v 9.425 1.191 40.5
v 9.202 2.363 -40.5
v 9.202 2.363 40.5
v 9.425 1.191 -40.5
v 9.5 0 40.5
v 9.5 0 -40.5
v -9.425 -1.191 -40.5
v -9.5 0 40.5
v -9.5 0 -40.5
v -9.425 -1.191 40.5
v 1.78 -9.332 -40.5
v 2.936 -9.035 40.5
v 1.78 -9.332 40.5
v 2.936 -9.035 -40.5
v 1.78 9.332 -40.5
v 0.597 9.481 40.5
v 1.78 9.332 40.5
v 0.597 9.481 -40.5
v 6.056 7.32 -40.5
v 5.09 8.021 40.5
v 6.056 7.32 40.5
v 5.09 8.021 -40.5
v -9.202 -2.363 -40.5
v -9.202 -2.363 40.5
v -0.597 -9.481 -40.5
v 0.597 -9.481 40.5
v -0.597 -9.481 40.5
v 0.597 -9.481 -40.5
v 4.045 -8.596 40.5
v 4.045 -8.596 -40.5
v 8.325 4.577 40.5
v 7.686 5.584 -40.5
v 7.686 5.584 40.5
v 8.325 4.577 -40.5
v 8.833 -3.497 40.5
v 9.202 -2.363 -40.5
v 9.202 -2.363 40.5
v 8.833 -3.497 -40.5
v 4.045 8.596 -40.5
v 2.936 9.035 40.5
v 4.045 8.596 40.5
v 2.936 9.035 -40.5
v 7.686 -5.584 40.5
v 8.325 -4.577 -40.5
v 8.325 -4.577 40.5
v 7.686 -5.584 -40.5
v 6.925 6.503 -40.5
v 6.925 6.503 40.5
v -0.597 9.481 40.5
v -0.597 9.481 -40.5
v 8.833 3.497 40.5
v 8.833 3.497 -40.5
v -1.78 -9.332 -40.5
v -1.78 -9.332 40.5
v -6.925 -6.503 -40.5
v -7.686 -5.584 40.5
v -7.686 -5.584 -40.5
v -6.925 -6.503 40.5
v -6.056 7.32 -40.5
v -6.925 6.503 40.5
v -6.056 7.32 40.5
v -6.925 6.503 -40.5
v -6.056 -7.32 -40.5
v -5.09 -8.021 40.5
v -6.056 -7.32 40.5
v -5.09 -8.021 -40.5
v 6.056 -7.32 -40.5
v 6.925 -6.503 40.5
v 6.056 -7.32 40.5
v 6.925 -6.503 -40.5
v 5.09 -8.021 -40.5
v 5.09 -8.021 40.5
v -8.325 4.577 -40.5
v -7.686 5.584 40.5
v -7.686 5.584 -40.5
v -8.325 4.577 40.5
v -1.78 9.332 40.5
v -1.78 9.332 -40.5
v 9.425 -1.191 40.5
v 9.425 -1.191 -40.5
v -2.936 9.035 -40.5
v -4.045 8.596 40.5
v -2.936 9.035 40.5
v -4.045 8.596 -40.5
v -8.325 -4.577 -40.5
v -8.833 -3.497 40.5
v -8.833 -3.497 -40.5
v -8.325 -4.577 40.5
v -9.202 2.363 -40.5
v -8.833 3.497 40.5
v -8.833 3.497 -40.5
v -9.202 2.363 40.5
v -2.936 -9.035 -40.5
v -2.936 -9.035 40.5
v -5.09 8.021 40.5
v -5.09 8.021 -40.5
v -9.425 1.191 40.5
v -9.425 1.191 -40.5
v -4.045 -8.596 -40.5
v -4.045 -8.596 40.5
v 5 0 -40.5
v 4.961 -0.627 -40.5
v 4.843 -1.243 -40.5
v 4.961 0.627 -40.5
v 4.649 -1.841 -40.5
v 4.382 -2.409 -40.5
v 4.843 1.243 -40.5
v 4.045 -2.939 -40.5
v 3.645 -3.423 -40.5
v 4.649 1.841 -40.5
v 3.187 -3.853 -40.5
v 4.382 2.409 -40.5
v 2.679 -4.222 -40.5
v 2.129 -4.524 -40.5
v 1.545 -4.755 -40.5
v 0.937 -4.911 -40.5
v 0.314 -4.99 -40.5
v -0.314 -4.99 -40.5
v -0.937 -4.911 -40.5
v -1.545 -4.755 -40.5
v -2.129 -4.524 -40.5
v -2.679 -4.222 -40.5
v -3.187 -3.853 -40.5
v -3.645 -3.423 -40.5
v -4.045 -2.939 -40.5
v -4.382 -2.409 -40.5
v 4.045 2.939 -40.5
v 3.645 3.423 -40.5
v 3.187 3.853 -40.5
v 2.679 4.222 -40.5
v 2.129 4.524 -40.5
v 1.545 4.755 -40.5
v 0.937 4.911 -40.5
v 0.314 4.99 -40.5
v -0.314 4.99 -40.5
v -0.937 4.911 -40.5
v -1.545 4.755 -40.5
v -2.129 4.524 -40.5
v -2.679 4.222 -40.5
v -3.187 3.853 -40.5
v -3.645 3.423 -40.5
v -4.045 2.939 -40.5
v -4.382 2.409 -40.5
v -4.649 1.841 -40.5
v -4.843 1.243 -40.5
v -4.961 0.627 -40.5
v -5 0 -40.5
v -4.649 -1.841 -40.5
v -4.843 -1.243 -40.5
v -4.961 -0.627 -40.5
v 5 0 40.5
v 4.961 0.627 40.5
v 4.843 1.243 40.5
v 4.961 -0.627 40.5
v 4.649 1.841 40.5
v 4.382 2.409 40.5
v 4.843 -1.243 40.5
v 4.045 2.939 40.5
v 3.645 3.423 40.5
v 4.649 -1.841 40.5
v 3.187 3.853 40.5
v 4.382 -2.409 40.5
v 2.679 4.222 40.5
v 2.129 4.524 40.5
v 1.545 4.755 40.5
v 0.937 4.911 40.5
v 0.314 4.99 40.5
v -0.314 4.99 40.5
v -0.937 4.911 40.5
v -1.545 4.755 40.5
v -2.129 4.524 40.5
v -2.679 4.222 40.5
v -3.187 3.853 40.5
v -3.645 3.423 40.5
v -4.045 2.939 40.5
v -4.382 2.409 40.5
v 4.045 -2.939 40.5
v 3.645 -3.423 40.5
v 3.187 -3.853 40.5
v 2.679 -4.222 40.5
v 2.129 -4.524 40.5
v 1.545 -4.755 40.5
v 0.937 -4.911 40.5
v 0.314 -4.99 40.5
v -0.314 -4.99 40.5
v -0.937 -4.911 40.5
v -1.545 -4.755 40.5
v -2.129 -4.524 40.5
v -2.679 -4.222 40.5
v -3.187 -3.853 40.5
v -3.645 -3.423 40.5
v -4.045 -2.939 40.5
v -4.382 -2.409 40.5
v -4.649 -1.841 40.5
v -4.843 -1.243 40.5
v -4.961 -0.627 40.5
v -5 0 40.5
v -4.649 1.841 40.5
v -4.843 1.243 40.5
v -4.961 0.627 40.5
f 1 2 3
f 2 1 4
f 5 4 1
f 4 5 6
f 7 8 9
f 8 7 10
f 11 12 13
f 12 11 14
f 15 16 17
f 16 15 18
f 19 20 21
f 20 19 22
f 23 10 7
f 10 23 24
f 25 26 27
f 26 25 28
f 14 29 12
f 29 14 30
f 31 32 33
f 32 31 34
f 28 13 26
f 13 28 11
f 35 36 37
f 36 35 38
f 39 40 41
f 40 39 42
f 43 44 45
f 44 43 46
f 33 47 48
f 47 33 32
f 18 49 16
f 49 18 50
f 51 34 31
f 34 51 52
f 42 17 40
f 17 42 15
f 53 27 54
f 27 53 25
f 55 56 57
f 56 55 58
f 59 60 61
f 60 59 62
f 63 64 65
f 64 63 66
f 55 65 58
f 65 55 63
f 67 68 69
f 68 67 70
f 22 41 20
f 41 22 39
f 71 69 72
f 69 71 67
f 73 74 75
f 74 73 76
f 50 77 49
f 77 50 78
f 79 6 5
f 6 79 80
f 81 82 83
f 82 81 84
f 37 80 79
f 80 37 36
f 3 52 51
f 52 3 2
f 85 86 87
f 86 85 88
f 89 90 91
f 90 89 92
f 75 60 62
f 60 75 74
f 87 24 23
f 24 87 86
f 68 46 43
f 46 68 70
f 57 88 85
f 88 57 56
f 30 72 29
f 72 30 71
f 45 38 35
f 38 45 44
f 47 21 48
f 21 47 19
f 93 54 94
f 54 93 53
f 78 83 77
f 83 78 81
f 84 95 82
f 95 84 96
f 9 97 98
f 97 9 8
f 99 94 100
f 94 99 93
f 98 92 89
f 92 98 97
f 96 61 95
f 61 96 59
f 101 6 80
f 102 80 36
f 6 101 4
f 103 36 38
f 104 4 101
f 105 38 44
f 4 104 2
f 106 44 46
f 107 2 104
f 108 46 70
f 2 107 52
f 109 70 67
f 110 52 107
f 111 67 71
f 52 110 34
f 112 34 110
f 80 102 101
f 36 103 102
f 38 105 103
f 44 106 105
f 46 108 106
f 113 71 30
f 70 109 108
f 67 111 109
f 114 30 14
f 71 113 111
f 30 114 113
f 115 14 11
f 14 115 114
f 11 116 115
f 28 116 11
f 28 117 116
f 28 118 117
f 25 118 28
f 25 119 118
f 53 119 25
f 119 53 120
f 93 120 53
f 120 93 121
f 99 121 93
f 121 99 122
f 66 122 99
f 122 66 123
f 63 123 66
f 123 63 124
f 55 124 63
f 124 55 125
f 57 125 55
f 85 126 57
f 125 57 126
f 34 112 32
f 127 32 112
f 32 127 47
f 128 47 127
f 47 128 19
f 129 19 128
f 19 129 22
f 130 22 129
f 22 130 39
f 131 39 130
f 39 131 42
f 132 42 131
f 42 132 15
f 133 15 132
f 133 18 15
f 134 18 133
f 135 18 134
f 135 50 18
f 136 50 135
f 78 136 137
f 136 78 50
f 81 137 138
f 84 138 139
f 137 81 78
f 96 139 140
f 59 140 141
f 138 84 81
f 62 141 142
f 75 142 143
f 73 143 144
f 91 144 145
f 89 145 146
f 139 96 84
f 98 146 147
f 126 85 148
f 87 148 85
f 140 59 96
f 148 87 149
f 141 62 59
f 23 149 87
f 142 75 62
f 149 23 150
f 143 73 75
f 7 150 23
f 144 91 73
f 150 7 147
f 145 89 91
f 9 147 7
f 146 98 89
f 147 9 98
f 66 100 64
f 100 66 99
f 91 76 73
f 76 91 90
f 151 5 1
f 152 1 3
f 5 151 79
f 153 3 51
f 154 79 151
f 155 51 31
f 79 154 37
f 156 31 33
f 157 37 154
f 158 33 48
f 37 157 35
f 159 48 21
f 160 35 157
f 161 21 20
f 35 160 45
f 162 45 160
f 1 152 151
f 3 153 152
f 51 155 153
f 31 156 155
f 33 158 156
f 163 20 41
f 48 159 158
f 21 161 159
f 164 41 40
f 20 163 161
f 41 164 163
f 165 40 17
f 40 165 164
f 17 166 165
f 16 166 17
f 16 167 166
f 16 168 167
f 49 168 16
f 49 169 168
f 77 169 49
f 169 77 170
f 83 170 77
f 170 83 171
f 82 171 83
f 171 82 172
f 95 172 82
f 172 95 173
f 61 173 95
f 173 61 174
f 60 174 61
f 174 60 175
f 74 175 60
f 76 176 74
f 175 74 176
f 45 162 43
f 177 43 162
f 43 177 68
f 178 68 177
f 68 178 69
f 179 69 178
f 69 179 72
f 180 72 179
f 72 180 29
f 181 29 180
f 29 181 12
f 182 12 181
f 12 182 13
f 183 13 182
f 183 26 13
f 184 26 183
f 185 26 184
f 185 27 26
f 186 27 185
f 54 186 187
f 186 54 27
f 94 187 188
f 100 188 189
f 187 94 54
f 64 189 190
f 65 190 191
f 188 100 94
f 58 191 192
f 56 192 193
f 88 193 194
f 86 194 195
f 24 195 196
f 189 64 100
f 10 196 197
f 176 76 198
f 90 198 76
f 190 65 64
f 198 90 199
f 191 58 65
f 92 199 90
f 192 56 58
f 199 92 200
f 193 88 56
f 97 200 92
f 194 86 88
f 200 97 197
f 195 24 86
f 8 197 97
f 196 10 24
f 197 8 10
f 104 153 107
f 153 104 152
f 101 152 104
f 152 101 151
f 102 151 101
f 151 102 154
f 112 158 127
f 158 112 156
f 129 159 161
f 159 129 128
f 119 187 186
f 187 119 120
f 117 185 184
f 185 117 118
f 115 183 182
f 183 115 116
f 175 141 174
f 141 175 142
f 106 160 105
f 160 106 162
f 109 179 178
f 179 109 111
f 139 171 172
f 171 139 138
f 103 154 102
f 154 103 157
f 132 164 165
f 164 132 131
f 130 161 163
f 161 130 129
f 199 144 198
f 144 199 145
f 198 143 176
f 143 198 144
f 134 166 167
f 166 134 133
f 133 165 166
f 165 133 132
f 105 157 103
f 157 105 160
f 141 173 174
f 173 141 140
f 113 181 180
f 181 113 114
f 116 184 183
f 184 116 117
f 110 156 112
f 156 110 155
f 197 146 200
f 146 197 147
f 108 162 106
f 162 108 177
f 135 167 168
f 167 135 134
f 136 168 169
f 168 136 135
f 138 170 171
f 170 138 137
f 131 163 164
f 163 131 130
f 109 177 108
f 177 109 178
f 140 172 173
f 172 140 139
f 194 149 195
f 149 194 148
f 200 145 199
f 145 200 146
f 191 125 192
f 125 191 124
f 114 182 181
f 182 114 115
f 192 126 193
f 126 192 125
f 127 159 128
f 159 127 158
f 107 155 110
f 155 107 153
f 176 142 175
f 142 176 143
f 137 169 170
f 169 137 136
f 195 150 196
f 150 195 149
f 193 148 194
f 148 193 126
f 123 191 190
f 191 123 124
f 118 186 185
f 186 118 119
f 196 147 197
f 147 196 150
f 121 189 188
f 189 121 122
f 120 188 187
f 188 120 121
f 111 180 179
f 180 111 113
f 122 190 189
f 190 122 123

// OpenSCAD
$fn = 50;


difference() {
	union() {
		translate(v = [0, 0, -40.5000000000]) {
			cylinder(h = 81, r = 9.5000000000);
		}
	}
	union() {
		translate(v = [0, 0, -100.0000000000]) {
			cylinder(h = 200, r = 5.0000000000);
		}
	}
}
